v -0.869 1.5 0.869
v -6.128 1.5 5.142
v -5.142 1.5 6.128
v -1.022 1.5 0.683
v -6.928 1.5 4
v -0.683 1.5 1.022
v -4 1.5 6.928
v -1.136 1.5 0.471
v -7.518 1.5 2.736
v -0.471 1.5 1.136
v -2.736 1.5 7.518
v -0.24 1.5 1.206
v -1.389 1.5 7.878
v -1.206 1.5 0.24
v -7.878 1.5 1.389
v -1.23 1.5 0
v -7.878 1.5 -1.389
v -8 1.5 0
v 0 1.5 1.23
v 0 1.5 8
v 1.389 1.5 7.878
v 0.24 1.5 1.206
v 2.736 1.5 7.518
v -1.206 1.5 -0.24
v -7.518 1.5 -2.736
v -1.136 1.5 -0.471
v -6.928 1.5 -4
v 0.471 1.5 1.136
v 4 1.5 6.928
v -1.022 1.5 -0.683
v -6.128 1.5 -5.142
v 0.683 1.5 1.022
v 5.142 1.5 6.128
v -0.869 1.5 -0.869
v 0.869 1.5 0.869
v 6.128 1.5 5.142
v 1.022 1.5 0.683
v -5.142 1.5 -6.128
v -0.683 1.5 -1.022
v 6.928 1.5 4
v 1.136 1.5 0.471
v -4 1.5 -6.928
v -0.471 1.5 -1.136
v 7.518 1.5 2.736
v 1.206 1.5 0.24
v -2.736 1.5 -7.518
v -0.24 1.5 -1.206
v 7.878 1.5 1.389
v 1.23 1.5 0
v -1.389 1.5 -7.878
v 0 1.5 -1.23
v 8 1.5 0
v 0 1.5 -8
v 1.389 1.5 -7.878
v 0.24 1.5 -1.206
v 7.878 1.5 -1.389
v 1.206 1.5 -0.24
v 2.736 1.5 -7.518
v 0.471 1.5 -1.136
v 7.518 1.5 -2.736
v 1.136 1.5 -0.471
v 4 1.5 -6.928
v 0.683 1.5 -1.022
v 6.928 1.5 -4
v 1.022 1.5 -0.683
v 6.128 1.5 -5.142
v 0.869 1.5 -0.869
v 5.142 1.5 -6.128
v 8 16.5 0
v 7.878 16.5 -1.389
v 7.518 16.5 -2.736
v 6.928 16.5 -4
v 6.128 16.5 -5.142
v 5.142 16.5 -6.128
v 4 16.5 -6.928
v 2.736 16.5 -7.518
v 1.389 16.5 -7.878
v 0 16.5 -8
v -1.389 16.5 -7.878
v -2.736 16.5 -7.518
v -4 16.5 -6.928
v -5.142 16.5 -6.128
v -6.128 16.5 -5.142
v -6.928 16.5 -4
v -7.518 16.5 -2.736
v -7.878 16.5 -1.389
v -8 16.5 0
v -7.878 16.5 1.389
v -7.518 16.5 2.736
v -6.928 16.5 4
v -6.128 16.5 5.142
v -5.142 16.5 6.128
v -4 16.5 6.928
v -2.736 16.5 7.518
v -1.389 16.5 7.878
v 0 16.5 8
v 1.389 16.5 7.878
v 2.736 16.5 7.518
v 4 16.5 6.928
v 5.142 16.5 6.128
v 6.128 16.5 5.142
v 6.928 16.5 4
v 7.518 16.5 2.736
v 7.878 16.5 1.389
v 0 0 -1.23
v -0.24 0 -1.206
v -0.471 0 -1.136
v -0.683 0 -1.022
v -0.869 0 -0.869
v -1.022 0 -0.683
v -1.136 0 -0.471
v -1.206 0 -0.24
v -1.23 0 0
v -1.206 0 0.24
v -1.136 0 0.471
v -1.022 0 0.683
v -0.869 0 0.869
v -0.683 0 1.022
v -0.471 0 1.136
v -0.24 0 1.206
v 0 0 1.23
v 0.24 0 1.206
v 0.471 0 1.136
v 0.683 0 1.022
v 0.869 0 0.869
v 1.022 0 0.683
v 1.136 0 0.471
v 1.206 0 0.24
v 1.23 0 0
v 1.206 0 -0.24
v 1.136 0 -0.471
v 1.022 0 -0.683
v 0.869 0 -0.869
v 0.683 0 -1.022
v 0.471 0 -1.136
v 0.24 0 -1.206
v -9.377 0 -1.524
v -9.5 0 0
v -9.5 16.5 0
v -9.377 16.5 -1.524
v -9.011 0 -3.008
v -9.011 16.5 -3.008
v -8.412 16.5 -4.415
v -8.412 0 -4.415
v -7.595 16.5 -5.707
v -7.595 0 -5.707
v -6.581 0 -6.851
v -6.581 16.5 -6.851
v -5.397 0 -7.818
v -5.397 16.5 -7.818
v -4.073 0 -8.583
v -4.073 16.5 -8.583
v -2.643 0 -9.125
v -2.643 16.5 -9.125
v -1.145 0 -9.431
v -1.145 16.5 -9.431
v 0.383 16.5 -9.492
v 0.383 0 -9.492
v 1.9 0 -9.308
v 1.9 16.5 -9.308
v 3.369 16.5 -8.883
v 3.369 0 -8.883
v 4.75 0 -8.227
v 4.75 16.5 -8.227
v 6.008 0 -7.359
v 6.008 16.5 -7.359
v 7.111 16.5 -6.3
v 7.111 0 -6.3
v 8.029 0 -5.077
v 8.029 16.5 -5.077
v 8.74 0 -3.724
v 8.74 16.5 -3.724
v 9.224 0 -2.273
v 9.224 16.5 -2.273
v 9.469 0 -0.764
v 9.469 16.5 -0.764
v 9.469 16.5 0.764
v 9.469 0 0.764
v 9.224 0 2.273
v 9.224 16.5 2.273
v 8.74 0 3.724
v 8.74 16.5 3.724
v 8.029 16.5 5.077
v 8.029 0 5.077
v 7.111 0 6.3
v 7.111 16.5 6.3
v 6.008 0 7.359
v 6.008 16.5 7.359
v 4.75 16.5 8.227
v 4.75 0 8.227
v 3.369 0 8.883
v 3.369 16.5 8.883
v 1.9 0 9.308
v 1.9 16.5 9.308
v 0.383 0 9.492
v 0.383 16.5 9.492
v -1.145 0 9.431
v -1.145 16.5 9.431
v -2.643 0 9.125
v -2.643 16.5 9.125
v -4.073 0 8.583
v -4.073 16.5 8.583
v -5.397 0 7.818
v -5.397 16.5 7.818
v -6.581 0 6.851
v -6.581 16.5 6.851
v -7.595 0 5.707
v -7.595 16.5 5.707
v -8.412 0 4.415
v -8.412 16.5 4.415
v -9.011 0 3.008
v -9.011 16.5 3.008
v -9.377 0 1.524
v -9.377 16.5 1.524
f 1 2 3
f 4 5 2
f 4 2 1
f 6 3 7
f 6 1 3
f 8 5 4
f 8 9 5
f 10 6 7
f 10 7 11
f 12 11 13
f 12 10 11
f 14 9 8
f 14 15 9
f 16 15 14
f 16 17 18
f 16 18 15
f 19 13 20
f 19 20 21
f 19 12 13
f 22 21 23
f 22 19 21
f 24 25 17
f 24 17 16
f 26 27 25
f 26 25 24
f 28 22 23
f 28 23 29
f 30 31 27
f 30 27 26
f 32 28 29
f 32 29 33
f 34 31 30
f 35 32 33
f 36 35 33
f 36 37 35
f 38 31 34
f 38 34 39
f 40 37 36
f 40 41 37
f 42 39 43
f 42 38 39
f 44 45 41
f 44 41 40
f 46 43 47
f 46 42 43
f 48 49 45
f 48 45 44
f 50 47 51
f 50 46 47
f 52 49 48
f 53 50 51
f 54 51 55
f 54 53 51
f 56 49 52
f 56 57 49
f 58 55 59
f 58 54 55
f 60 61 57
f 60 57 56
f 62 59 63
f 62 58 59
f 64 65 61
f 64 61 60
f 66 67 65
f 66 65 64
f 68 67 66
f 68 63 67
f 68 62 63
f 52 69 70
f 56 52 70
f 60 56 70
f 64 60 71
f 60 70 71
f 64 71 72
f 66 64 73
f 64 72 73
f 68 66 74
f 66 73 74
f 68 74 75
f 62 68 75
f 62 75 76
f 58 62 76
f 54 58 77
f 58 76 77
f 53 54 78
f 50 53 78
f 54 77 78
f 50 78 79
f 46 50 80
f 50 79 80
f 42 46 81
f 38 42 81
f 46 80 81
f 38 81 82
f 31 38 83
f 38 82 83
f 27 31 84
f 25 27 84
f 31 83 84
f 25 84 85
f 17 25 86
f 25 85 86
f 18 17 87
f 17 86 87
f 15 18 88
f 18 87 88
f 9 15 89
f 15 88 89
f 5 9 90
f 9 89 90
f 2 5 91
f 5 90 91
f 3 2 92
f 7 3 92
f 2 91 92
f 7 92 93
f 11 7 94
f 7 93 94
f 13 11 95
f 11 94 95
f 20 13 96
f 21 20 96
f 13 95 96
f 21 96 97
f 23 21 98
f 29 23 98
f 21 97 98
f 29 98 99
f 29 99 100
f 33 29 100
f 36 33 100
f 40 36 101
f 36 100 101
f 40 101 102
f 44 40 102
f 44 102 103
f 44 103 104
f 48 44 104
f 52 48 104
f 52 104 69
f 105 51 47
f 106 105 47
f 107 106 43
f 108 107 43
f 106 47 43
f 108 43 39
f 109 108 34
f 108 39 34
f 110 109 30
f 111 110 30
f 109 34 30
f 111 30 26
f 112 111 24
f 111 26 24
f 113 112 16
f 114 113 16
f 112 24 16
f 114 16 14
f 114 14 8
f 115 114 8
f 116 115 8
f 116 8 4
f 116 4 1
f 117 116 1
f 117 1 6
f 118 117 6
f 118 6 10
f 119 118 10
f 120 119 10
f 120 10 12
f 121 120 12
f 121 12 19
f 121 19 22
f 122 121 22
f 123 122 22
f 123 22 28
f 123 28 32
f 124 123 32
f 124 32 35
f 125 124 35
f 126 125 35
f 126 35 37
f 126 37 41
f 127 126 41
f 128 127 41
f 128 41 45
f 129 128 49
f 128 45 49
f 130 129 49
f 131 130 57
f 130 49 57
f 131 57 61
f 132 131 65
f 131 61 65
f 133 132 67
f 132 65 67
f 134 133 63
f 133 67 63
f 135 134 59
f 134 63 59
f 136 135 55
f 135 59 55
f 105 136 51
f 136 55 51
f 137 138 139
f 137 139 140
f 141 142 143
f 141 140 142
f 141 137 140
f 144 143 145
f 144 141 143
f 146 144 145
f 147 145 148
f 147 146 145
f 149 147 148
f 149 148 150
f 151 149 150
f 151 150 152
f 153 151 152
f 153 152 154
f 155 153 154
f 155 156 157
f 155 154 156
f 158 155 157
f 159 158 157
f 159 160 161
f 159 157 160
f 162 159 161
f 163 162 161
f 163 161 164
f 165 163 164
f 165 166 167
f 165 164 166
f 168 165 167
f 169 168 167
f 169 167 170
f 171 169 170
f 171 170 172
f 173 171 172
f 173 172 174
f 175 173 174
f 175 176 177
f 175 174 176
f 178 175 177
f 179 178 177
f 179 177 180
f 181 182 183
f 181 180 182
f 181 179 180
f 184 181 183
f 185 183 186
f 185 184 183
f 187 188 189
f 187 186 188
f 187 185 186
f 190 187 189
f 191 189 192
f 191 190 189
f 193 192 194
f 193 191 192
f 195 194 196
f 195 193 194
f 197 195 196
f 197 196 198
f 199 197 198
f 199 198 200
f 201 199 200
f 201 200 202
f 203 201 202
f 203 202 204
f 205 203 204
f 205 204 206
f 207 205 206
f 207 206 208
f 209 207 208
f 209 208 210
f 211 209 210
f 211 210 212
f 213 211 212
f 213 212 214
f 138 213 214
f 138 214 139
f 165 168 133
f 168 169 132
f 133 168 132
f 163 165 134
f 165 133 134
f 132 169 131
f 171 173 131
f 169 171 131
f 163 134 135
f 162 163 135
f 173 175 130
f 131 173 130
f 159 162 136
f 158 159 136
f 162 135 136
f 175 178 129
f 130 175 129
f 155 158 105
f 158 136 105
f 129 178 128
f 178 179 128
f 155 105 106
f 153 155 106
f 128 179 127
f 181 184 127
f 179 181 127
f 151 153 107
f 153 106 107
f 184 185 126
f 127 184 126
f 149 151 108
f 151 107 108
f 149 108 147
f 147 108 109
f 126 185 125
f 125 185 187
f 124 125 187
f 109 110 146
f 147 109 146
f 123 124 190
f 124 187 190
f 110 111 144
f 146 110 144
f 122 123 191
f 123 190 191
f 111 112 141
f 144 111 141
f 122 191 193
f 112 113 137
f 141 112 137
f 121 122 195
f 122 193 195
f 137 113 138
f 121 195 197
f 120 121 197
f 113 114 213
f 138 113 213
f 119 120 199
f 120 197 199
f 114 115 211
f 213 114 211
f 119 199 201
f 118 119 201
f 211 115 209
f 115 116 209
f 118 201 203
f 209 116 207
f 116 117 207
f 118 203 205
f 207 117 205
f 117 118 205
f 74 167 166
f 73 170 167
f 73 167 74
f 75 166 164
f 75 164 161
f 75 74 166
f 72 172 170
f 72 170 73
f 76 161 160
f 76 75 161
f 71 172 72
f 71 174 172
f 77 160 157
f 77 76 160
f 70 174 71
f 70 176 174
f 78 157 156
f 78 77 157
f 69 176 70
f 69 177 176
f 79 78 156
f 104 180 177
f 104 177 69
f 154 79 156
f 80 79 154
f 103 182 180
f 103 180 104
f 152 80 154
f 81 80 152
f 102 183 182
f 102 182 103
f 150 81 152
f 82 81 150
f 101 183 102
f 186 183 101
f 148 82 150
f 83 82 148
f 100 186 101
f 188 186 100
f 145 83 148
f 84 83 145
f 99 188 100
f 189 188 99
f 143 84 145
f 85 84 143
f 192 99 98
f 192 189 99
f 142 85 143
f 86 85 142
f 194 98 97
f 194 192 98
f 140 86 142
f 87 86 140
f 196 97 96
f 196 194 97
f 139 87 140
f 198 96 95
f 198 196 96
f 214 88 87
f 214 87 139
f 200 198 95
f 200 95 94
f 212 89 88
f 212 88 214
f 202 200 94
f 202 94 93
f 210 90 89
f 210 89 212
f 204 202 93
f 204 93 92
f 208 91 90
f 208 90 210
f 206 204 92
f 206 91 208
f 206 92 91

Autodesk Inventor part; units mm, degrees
ref_plane "YZ Plane" through (0, 0, 0) normal (1, 0, 0) x (0, 1, 0)
ref_plane "XZ Plane" through (0, 0, 0) normal (0, 1, 0) x (-1, 0, 0)
ref_plane "XY Plane" through (0, 0, 0) normal (0, 0, 1) x (1, 0, 0)
sketch "Skizze1" plane through (0, 0, 0) normal (0, 1, 0) x (-1, 0, 0)
  circle A0 centre (0, 0) radius 9.5
  dimension "d0" = 19
extrude "Extrusion1" add sketch "Skizze1" along normal blind 16.5
sketch "Skizze2" plane through (0, 16.5, 0) normal (0, 1, 0) x (1, 0, 0)
  circle A0 centre (0, 0) radius 8
  dimension "d3" = 16
extrude "Extrusion2" cut sketch "Skizze2" against normal blind 15
sketch "Skizze3" plane through (0, 0, 0) normal (0, -1, 0) x (1, 0, 0)
  circle A0 centre (0, 0) radius 9.5 projected
hole "Bohrung1" at (0, 0, 0) direction (0, 1, 0) diameter 2.459 depth 1.5 thread size "M3x0.5" class "6H" standard "ISO Metric profile"
properties part number "23"
